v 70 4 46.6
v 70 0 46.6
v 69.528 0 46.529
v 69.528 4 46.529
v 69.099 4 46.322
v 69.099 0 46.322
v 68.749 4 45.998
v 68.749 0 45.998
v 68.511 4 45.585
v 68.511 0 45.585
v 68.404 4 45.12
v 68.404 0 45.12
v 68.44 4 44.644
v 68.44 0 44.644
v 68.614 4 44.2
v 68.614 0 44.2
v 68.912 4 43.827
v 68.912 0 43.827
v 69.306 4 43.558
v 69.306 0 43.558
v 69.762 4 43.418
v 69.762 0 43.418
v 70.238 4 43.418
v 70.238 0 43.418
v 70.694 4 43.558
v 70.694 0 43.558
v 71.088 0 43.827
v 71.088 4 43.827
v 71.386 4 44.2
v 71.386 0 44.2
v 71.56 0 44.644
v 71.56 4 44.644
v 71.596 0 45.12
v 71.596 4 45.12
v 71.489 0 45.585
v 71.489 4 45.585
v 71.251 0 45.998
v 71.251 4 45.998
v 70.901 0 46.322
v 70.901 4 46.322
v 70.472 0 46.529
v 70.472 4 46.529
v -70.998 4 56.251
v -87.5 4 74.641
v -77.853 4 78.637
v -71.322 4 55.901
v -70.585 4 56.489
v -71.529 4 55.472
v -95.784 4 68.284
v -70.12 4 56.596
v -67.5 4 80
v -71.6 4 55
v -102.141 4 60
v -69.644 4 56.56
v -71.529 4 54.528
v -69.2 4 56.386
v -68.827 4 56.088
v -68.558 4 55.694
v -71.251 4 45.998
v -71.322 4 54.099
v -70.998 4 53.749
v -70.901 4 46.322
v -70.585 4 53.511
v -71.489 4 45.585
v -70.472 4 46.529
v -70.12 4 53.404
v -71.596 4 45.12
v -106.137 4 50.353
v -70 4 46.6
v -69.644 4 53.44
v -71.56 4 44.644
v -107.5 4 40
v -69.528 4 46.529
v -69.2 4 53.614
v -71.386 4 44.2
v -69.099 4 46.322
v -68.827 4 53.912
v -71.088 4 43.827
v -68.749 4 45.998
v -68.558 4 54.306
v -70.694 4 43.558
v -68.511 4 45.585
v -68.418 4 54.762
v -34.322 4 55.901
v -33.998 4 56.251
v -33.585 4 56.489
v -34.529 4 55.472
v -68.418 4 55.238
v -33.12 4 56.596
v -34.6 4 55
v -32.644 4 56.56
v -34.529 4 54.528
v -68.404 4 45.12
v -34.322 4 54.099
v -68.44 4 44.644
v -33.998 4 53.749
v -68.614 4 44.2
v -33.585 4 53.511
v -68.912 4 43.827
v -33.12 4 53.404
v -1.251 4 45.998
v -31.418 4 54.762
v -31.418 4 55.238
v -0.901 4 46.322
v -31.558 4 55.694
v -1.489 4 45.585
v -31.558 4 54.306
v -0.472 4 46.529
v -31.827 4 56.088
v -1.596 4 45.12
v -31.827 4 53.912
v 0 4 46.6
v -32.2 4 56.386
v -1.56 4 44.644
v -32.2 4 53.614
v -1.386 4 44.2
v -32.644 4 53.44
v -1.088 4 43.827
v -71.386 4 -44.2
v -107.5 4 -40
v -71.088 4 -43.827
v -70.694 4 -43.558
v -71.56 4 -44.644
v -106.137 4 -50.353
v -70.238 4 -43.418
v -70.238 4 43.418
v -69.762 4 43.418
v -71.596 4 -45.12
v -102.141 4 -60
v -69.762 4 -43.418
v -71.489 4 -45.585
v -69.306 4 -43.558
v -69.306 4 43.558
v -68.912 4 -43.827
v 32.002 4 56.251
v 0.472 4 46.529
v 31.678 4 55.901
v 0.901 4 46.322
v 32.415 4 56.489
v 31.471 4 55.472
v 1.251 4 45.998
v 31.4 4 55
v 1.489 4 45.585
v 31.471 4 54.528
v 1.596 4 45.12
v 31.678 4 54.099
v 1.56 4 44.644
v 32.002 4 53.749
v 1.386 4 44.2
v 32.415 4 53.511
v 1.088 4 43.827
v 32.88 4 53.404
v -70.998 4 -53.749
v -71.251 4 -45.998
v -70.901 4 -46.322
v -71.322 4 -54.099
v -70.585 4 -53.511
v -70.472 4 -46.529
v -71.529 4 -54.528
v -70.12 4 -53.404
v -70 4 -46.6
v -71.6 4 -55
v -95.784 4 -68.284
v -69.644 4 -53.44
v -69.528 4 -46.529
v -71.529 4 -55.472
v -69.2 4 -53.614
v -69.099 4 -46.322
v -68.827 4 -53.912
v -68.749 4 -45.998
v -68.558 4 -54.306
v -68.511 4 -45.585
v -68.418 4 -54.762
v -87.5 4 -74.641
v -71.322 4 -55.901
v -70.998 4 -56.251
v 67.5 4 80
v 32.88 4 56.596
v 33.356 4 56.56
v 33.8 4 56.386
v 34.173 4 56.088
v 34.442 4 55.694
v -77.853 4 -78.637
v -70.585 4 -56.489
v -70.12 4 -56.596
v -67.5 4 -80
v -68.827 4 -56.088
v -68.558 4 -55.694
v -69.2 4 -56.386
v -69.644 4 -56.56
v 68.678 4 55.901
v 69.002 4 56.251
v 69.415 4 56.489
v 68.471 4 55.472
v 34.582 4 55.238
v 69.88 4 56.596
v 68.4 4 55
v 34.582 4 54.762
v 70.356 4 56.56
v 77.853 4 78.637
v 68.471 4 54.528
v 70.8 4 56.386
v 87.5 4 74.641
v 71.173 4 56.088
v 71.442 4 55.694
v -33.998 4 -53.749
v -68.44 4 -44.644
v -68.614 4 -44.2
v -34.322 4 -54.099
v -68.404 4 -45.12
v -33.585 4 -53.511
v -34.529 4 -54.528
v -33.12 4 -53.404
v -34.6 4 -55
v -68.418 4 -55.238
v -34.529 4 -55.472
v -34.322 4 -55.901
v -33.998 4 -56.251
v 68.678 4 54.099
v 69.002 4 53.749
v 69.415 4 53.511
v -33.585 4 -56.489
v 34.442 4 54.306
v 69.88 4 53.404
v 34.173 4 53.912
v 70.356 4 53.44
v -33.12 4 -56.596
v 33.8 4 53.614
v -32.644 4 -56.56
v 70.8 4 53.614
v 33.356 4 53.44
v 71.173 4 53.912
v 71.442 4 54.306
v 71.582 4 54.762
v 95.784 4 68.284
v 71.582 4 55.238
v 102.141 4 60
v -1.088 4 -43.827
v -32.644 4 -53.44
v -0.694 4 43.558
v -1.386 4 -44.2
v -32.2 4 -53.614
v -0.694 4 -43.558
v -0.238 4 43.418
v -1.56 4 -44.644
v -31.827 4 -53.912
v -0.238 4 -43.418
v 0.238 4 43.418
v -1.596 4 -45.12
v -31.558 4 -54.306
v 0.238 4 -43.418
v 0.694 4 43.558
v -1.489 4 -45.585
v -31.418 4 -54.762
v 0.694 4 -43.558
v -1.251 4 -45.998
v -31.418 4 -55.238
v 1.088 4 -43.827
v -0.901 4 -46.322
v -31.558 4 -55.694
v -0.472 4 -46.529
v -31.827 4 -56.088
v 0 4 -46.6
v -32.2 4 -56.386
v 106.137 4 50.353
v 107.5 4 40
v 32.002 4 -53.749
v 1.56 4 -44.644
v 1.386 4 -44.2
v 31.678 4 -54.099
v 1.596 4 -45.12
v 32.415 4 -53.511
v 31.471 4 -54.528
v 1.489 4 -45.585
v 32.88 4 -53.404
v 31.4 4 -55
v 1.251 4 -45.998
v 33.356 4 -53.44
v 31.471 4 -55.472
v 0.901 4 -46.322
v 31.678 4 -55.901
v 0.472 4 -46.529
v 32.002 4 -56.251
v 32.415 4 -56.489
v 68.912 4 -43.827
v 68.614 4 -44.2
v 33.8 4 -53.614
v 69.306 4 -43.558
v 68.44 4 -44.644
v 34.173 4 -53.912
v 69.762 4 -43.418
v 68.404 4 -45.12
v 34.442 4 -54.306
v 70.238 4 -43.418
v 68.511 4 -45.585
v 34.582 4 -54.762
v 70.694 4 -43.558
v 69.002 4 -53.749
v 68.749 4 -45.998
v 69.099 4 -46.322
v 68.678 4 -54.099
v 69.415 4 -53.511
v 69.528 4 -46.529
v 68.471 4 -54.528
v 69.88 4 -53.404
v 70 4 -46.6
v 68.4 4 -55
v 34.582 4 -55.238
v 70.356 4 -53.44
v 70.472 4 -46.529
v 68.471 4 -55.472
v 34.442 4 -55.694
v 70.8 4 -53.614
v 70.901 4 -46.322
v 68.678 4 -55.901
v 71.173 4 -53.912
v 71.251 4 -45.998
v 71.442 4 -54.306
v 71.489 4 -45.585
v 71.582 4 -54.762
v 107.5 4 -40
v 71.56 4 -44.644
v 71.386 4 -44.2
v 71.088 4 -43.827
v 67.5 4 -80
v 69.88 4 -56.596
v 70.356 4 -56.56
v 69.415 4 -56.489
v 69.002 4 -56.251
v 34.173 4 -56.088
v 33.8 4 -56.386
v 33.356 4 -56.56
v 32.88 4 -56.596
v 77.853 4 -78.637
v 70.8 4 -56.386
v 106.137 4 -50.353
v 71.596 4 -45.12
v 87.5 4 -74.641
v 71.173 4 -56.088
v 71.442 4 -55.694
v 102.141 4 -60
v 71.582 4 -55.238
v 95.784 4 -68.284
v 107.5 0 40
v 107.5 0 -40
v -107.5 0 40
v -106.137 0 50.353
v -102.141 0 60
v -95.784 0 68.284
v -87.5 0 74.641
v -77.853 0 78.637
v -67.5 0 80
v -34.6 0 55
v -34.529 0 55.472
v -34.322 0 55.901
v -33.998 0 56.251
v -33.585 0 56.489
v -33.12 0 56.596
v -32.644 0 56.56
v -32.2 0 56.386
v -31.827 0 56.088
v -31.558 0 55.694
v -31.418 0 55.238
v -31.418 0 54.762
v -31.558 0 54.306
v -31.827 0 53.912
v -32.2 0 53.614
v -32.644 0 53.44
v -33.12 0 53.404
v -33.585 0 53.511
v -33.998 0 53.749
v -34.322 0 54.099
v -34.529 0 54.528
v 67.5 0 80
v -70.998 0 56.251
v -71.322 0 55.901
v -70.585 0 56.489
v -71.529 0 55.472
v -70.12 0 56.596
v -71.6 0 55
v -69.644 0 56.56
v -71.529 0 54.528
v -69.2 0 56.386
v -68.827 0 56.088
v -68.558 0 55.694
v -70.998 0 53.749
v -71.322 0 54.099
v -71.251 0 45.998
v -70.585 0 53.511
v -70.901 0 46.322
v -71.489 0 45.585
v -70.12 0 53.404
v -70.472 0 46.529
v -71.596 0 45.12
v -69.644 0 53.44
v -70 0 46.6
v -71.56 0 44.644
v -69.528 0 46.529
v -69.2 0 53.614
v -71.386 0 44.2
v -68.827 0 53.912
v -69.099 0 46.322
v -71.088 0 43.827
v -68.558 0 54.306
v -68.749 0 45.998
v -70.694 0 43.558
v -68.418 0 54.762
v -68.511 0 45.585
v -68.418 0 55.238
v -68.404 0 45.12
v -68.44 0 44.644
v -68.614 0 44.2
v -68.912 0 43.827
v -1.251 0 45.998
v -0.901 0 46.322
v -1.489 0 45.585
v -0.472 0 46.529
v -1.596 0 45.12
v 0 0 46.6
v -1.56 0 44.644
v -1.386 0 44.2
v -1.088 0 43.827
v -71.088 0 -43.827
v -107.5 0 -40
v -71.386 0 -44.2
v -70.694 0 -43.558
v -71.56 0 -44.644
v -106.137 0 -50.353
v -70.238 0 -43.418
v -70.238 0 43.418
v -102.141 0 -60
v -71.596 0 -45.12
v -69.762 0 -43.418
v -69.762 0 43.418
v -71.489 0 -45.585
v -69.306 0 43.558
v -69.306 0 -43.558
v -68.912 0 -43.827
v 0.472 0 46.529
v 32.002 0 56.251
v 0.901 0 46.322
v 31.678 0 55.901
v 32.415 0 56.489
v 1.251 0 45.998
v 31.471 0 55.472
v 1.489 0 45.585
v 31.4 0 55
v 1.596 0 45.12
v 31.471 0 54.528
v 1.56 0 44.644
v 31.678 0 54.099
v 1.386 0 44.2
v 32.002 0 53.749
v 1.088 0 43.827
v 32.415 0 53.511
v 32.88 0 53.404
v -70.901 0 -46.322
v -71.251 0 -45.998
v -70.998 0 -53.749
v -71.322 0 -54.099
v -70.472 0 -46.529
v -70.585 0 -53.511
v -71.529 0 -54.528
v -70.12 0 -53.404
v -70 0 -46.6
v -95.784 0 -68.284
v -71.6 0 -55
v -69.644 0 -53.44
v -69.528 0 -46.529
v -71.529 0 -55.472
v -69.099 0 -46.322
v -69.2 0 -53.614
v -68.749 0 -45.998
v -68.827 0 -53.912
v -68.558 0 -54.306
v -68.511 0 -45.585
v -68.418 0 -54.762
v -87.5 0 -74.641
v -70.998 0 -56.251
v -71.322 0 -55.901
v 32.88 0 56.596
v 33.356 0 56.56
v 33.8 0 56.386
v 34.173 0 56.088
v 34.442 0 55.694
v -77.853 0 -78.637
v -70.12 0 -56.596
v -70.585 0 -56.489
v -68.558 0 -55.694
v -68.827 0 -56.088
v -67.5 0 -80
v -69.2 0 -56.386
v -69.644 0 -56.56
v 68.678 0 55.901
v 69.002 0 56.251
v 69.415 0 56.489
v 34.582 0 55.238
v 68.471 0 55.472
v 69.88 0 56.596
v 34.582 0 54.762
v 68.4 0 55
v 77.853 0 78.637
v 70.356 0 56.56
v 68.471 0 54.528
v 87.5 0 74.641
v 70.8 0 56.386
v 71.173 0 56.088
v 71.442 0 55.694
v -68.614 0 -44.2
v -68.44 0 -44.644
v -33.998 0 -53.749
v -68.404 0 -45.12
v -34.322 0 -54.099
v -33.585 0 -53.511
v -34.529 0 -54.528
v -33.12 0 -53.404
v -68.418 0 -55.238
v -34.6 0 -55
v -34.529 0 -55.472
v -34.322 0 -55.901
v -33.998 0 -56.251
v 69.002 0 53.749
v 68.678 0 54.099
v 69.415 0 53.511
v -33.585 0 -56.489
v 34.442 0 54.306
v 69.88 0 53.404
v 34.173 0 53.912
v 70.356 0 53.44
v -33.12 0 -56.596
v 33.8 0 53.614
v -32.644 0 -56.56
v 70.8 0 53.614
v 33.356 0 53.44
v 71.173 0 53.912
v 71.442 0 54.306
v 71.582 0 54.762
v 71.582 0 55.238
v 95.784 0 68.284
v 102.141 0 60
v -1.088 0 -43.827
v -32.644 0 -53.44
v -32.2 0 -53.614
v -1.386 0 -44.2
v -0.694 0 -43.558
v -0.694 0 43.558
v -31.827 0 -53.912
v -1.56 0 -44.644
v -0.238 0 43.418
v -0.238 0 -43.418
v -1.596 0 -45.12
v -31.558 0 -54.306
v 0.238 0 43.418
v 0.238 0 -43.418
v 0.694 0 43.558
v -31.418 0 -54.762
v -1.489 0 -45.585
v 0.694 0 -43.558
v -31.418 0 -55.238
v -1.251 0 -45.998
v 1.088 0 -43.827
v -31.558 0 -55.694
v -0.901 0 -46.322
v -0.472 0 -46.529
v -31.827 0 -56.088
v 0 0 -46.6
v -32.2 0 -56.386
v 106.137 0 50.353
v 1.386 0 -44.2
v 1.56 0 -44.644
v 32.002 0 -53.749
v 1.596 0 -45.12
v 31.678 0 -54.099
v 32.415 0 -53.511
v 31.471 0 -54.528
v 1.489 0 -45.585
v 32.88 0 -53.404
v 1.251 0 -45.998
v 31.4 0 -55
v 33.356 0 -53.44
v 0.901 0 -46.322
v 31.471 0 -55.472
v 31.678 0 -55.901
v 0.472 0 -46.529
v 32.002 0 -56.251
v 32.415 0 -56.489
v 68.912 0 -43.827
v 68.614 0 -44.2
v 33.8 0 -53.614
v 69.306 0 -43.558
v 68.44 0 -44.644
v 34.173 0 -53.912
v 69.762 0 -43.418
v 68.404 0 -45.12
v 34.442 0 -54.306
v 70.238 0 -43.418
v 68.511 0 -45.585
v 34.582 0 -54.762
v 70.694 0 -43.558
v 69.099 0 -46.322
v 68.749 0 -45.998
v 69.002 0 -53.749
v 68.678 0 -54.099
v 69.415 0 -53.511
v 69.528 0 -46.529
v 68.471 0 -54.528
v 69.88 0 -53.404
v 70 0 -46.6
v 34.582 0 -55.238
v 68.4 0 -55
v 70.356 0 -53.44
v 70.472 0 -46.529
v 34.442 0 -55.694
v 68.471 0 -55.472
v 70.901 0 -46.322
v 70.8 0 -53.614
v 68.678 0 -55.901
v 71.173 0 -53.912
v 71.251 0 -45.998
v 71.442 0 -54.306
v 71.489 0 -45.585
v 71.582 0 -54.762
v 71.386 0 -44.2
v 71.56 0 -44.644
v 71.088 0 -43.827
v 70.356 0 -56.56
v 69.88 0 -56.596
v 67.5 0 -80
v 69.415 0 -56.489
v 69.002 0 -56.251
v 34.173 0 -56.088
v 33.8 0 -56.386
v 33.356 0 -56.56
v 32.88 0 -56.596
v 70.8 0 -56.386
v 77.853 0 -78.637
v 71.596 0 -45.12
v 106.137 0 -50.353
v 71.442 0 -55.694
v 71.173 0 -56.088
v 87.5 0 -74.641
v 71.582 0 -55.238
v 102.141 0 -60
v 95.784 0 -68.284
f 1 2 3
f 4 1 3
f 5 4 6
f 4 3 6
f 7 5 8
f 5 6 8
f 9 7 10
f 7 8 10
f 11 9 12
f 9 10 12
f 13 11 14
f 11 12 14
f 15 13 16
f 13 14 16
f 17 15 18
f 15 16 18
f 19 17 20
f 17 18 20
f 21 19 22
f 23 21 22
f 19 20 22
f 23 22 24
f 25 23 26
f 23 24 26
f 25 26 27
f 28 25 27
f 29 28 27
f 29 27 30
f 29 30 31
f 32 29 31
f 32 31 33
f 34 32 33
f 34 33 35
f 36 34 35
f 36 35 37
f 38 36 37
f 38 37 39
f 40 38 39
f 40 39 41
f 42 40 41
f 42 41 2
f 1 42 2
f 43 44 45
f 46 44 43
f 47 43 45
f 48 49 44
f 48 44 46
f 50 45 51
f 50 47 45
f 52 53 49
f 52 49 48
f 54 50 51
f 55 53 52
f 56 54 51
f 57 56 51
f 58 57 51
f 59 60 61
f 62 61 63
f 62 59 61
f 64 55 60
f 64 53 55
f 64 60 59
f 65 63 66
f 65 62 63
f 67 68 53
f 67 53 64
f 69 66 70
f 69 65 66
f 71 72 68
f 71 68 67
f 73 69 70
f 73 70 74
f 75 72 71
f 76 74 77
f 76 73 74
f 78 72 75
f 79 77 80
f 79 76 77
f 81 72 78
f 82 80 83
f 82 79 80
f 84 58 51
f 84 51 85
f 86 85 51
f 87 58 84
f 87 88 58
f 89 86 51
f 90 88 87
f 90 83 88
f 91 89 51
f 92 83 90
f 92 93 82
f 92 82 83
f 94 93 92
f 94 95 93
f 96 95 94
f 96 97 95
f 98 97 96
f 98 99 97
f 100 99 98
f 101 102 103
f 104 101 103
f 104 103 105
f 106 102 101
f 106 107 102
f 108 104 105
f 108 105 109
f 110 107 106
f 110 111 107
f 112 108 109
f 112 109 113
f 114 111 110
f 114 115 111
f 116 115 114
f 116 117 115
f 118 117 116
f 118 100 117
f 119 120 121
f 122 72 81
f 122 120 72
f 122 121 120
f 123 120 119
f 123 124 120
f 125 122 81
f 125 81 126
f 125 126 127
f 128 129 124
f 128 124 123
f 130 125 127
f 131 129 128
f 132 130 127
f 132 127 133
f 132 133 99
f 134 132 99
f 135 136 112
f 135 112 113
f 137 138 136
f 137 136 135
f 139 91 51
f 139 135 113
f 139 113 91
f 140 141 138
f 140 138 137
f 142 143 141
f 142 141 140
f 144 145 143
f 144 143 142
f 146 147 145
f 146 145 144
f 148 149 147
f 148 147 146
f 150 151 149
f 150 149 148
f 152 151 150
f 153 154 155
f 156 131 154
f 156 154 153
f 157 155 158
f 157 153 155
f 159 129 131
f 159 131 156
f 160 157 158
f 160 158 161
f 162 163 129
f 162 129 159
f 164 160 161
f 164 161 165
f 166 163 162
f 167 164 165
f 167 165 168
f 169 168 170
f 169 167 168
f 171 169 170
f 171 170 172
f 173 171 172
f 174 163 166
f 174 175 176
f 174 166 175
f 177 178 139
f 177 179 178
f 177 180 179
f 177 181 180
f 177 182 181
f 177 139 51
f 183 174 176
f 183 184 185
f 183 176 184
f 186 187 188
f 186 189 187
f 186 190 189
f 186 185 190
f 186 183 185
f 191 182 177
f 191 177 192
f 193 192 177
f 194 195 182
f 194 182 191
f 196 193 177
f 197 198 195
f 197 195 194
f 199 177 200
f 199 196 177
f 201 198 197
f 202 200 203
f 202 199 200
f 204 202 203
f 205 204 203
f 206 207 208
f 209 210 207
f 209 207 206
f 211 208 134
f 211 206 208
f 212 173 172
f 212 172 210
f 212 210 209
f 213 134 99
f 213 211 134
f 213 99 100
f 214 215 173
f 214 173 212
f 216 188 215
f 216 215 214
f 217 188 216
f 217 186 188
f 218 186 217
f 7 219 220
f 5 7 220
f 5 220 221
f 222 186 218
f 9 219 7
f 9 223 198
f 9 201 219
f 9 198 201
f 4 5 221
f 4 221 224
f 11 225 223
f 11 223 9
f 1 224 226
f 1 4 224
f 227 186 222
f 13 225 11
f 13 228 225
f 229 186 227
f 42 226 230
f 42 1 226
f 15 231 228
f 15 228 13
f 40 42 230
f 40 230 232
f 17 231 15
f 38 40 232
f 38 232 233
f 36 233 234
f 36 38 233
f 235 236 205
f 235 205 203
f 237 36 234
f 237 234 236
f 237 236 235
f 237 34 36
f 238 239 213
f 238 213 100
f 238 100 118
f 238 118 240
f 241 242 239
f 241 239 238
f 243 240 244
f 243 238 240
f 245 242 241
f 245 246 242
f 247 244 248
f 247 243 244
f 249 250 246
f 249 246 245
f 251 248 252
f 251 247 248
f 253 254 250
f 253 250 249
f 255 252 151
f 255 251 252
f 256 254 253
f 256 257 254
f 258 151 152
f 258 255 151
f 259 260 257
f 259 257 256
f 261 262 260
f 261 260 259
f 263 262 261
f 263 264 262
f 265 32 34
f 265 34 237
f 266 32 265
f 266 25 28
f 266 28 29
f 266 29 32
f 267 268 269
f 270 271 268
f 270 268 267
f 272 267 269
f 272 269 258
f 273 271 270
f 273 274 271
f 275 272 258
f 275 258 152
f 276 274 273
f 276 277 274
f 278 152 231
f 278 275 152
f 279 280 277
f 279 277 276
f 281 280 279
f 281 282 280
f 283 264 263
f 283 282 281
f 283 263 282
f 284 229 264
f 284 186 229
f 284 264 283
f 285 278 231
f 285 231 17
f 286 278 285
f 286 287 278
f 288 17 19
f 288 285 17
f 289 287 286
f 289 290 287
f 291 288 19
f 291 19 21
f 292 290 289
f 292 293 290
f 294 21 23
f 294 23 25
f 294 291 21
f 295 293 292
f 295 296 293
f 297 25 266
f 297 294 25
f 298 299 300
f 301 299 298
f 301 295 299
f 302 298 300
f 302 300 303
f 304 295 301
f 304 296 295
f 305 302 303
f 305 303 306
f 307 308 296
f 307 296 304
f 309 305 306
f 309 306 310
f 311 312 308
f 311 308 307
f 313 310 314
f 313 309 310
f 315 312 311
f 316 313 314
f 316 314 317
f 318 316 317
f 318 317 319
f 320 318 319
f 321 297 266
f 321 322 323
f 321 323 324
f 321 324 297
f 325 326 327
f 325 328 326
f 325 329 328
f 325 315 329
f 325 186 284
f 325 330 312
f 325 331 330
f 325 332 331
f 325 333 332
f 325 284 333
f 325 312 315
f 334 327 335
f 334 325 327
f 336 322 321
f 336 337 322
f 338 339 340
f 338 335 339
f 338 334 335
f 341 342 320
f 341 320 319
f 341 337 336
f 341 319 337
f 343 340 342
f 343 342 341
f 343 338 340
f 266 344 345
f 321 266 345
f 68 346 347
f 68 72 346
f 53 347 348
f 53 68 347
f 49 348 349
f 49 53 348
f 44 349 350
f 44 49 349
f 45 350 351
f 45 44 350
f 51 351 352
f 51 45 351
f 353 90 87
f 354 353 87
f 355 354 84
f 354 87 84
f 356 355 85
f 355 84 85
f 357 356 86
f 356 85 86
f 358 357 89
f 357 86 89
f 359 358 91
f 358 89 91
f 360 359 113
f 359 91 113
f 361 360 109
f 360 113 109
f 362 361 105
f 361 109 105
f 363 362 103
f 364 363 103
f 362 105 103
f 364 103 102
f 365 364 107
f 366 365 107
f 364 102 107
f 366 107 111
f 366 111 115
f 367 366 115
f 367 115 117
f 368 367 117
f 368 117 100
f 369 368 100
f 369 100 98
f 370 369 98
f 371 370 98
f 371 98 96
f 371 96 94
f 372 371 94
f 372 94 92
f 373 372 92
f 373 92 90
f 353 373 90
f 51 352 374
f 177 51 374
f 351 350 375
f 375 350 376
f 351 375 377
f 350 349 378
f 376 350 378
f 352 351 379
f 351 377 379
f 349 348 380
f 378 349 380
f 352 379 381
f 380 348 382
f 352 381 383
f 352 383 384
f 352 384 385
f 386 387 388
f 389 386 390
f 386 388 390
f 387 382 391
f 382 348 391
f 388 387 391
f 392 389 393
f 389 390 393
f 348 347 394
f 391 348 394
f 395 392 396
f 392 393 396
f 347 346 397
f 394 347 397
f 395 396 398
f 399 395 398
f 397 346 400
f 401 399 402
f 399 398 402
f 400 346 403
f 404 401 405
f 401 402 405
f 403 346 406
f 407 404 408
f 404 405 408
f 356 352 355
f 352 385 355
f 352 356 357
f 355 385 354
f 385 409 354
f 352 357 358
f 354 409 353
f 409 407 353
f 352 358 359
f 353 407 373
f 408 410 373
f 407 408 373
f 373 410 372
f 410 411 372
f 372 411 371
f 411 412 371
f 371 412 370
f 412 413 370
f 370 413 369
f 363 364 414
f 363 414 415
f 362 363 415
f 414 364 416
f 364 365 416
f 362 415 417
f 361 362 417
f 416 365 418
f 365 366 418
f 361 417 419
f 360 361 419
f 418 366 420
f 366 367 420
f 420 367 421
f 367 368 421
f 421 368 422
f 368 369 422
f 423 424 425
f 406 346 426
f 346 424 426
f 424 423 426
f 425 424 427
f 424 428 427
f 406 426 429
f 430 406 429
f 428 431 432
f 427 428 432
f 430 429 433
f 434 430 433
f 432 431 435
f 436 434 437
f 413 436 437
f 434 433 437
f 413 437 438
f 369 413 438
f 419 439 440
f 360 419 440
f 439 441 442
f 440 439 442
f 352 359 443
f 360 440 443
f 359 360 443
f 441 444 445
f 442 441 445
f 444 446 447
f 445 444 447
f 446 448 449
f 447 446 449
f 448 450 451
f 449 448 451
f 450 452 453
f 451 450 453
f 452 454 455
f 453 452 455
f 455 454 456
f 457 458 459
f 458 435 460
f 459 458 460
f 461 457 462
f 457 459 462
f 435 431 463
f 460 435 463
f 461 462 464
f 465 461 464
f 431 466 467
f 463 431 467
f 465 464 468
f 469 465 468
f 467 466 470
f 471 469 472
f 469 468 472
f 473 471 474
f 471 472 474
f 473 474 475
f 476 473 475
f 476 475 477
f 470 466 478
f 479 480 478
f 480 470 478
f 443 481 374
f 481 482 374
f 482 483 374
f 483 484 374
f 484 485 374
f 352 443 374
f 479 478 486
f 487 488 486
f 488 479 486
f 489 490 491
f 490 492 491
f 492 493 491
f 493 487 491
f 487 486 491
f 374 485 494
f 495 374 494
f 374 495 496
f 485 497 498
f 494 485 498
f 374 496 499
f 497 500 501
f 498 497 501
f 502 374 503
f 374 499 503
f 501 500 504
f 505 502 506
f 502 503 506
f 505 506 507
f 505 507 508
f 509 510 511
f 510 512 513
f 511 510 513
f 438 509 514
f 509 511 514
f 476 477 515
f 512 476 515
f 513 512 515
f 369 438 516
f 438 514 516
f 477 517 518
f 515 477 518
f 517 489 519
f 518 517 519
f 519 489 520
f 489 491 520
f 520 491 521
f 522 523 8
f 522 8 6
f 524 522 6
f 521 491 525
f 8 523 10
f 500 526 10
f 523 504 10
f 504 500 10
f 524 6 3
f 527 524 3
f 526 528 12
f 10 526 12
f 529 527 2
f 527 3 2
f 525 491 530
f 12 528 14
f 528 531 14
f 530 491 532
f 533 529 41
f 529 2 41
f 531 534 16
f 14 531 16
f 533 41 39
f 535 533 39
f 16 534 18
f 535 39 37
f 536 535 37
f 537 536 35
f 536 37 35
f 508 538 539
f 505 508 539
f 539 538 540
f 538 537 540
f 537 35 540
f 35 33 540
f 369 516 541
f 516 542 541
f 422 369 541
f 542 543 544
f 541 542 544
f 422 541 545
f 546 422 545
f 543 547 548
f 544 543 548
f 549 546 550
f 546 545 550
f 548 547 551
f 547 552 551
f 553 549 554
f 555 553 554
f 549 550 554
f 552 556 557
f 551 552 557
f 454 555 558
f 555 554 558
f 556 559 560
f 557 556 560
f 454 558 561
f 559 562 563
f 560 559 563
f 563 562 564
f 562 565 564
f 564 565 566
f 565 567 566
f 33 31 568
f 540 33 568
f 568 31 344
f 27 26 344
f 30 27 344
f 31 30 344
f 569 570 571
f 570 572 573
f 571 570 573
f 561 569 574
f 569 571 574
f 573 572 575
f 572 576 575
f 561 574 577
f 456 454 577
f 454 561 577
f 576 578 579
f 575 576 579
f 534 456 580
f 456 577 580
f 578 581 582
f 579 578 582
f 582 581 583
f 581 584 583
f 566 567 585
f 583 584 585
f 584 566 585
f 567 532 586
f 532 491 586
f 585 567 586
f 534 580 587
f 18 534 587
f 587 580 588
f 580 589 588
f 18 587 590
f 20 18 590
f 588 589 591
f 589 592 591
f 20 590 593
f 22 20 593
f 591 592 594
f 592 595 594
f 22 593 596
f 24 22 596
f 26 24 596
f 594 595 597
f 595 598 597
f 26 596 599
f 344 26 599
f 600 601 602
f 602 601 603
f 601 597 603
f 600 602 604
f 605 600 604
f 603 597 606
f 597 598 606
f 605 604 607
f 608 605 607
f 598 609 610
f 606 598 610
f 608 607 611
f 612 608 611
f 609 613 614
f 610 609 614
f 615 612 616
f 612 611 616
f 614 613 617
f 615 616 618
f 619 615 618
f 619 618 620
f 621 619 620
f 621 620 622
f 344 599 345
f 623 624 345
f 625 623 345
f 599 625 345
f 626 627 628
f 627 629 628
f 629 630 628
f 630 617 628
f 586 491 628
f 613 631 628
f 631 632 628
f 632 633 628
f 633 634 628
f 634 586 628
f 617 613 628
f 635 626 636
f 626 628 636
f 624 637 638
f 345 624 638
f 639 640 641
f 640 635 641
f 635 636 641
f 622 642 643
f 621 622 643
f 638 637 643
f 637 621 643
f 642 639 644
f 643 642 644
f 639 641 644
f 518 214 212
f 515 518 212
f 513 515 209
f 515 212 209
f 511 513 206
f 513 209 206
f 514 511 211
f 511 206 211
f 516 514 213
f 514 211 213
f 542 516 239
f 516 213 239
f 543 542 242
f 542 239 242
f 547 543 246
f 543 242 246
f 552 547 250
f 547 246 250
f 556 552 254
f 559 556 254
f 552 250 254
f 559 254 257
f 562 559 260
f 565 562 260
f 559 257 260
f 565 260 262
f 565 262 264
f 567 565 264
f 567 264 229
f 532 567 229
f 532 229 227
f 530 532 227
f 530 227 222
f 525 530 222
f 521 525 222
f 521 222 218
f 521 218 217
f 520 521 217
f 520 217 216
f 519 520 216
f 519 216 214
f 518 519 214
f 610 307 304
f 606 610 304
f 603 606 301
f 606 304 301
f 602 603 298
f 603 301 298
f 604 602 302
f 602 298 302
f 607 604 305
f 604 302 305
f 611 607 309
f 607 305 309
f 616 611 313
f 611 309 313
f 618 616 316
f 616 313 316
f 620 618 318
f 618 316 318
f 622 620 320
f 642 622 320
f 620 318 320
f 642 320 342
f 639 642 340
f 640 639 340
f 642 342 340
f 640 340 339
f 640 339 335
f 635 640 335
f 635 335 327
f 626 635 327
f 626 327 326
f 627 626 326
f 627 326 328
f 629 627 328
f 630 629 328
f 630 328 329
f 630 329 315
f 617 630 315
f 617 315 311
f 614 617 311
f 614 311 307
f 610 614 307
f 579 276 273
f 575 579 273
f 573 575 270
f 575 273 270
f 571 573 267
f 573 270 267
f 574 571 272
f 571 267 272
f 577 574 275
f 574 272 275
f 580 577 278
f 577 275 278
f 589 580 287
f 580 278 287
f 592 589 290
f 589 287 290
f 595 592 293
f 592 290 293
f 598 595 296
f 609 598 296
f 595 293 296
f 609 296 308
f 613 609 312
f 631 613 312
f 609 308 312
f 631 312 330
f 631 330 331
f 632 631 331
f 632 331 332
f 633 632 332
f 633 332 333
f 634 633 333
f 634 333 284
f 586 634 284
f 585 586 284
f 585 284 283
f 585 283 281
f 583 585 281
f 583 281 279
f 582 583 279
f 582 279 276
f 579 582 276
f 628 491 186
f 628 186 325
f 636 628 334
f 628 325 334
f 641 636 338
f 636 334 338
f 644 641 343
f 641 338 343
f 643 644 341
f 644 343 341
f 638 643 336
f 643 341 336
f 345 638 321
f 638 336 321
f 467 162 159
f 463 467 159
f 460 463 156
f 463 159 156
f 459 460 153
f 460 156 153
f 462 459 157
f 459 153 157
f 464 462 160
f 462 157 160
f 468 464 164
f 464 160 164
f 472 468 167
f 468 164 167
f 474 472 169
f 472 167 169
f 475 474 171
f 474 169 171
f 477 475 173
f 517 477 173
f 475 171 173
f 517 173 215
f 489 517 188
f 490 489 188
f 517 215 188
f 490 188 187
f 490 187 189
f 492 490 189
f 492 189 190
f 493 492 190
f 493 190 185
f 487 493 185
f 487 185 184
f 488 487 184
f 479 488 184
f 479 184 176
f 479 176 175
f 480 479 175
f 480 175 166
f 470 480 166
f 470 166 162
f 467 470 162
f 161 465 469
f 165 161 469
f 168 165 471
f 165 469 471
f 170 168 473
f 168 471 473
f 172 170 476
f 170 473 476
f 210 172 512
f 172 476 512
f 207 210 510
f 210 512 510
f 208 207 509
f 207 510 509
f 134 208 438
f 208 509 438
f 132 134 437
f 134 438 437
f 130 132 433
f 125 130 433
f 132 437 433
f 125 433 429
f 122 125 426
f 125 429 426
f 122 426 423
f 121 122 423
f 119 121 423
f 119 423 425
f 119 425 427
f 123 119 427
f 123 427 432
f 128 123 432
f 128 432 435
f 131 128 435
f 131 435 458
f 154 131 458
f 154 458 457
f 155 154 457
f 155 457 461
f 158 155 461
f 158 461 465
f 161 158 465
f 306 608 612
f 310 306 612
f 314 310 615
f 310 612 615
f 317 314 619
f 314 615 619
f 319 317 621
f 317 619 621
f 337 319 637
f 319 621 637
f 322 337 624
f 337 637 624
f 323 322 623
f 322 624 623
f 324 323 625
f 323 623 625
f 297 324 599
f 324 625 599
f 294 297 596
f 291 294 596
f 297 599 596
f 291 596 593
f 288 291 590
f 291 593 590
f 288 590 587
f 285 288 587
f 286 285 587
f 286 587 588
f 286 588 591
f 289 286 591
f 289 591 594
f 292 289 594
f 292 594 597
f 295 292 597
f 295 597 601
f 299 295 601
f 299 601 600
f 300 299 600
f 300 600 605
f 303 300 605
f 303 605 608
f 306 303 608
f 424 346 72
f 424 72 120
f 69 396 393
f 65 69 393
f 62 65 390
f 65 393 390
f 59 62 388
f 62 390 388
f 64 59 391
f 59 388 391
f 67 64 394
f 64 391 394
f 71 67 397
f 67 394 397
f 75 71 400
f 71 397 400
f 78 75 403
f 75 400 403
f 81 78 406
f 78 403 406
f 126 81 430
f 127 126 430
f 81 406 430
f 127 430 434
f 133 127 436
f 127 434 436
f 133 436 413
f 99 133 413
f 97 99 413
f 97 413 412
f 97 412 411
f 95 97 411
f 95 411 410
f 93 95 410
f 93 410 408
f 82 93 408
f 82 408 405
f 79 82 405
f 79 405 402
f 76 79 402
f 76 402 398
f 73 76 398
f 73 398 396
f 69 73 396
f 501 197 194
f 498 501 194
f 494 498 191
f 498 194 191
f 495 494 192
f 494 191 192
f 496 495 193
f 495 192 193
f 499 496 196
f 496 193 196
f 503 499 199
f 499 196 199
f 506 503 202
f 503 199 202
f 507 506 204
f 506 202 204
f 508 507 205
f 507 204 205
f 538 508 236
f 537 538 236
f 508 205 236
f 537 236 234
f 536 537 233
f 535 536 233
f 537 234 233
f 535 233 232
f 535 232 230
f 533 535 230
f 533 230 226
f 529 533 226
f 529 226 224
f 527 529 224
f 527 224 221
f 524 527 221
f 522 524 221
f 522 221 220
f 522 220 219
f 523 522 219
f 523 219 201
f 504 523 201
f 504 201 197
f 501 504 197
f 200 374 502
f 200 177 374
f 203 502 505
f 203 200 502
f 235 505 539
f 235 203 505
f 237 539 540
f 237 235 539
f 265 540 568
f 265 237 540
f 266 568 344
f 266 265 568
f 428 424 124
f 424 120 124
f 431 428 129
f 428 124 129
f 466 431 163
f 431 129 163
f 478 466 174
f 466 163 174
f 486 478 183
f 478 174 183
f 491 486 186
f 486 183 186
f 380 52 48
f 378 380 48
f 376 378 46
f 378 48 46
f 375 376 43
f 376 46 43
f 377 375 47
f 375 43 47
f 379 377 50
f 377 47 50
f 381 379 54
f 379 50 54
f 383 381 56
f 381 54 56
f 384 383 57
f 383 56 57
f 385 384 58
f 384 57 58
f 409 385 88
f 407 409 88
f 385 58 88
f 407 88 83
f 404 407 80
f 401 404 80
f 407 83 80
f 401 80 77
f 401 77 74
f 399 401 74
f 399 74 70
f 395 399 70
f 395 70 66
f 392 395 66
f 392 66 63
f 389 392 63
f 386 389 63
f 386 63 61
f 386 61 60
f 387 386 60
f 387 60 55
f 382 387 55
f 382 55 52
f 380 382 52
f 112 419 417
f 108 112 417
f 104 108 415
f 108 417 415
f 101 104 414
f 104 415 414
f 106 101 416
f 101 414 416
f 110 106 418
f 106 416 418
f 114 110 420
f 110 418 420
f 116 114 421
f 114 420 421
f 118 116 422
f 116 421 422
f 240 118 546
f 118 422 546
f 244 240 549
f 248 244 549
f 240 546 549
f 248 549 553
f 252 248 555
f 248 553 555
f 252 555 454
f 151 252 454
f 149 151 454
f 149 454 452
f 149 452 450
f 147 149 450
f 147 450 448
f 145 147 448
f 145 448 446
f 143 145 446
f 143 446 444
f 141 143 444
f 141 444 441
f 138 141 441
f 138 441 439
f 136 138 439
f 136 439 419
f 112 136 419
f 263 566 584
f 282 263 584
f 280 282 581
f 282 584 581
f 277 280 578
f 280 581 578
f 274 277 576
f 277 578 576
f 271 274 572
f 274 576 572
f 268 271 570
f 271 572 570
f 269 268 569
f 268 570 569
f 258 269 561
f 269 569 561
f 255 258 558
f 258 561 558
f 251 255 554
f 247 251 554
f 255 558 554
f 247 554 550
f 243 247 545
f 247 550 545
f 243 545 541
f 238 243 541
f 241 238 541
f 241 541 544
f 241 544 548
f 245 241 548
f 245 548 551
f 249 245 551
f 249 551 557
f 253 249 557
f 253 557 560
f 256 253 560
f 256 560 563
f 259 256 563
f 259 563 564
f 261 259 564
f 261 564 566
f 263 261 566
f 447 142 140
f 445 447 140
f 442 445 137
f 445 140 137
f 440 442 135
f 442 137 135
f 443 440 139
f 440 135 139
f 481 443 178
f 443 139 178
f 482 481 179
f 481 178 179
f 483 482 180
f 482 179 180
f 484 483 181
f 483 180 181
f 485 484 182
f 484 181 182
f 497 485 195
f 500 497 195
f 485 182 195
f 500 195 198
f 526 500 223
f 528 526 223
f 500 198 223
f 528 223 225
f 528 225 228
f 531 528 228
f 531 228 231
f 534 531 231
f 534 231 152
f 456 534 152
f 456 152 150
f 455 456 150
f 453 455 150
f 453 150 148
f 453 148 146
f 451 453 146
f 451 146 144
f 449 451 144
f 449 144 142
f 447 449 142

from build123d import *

# Parameters (mm, degrees)
SKETCH1_W                  = 215
SKETCH1_H                  = 160
BOSS_EXTRUDE1_DEPTH        = 4
F_1_0_3_2_DIAMETER_HOLE1_D = 3.2
FILLET1_R                  = 40
FILLET2_R                  = 40
SKETCH8_R                  = 1.6
CUT_EXTRUDE1_DEPTH         = 135.060620616


with BuildPart() as part:
    # Sketch1 → Boss-Extrude1 (new body)
    with BuildSketch(Plane(origin=(0, 0, 0), x_dir=(1, 0, 0), z_dir=(0, 1, 0))):
        Rectangle(SKETCH1_W, SKETCH1_H)
    extrude(amount=BOSS_EXTRUDE1_DEPTH)

    # Ø1.0 (3.2) Diameter Hole1 (through all)
    with Locations(Plane.XZ):
        with Locations((-70, 55), (33, 55), (-33, 55), (70, 55), (70, -55), (33, -55), (-33, -55), (-70, -55)):
            Hole(F_1_0_3_2_DIAMETER_HOLE1_D / 2)

    # Fillet1
    fillet1_edges = [part.edges().sort_by_distance(p)[0] for p in [
        (-107.5, 2, 80),
        (-107.5, 2, -80),
    ]]
    fillet(fillet1_edges, radius=FILLET1_R)

    # Fillet2
    fillet2_edges = [part.edges().sort_by_distance(p)[0] for p in [
        (107.5, 2, -80),
        (107.5, 2, 80),
    ]]
    fillet(fillet2_edges, radius=FILLET2_R)

    # Sketch8 → Cut-Extrude1 (cut, through all)
    with BuildSketch(Plane.XZ):
        with Locations(Location((-70, -45, 0), (0, 0, 270))):
            Circle(SKETCH8_R)
        with Locations(Location((0, -45, 0), (0, 0, 270))):
            Circle(SKETCH8_R)
        with Locations(Location((70, -45, 0), (0, 0, 270))):
            Circle(SKETCH8_R)
        with Locations(Location((70, 45, 0), (0, 0, 90))):
            Circle(SKETCH8_R)
        with Locations(Location((0, 45, 0), (0, 0, 90))):
            Circle(SKETCH8_R)
        with Locations(Location((-70, 45, 0), (0, 0, 90))):
            Circle(SKETCH8_R)
    extrude(amount=-CUT_EXTRUDE1_DEPTH, mode=Mode.SUBTRACT)


solid = part.part
